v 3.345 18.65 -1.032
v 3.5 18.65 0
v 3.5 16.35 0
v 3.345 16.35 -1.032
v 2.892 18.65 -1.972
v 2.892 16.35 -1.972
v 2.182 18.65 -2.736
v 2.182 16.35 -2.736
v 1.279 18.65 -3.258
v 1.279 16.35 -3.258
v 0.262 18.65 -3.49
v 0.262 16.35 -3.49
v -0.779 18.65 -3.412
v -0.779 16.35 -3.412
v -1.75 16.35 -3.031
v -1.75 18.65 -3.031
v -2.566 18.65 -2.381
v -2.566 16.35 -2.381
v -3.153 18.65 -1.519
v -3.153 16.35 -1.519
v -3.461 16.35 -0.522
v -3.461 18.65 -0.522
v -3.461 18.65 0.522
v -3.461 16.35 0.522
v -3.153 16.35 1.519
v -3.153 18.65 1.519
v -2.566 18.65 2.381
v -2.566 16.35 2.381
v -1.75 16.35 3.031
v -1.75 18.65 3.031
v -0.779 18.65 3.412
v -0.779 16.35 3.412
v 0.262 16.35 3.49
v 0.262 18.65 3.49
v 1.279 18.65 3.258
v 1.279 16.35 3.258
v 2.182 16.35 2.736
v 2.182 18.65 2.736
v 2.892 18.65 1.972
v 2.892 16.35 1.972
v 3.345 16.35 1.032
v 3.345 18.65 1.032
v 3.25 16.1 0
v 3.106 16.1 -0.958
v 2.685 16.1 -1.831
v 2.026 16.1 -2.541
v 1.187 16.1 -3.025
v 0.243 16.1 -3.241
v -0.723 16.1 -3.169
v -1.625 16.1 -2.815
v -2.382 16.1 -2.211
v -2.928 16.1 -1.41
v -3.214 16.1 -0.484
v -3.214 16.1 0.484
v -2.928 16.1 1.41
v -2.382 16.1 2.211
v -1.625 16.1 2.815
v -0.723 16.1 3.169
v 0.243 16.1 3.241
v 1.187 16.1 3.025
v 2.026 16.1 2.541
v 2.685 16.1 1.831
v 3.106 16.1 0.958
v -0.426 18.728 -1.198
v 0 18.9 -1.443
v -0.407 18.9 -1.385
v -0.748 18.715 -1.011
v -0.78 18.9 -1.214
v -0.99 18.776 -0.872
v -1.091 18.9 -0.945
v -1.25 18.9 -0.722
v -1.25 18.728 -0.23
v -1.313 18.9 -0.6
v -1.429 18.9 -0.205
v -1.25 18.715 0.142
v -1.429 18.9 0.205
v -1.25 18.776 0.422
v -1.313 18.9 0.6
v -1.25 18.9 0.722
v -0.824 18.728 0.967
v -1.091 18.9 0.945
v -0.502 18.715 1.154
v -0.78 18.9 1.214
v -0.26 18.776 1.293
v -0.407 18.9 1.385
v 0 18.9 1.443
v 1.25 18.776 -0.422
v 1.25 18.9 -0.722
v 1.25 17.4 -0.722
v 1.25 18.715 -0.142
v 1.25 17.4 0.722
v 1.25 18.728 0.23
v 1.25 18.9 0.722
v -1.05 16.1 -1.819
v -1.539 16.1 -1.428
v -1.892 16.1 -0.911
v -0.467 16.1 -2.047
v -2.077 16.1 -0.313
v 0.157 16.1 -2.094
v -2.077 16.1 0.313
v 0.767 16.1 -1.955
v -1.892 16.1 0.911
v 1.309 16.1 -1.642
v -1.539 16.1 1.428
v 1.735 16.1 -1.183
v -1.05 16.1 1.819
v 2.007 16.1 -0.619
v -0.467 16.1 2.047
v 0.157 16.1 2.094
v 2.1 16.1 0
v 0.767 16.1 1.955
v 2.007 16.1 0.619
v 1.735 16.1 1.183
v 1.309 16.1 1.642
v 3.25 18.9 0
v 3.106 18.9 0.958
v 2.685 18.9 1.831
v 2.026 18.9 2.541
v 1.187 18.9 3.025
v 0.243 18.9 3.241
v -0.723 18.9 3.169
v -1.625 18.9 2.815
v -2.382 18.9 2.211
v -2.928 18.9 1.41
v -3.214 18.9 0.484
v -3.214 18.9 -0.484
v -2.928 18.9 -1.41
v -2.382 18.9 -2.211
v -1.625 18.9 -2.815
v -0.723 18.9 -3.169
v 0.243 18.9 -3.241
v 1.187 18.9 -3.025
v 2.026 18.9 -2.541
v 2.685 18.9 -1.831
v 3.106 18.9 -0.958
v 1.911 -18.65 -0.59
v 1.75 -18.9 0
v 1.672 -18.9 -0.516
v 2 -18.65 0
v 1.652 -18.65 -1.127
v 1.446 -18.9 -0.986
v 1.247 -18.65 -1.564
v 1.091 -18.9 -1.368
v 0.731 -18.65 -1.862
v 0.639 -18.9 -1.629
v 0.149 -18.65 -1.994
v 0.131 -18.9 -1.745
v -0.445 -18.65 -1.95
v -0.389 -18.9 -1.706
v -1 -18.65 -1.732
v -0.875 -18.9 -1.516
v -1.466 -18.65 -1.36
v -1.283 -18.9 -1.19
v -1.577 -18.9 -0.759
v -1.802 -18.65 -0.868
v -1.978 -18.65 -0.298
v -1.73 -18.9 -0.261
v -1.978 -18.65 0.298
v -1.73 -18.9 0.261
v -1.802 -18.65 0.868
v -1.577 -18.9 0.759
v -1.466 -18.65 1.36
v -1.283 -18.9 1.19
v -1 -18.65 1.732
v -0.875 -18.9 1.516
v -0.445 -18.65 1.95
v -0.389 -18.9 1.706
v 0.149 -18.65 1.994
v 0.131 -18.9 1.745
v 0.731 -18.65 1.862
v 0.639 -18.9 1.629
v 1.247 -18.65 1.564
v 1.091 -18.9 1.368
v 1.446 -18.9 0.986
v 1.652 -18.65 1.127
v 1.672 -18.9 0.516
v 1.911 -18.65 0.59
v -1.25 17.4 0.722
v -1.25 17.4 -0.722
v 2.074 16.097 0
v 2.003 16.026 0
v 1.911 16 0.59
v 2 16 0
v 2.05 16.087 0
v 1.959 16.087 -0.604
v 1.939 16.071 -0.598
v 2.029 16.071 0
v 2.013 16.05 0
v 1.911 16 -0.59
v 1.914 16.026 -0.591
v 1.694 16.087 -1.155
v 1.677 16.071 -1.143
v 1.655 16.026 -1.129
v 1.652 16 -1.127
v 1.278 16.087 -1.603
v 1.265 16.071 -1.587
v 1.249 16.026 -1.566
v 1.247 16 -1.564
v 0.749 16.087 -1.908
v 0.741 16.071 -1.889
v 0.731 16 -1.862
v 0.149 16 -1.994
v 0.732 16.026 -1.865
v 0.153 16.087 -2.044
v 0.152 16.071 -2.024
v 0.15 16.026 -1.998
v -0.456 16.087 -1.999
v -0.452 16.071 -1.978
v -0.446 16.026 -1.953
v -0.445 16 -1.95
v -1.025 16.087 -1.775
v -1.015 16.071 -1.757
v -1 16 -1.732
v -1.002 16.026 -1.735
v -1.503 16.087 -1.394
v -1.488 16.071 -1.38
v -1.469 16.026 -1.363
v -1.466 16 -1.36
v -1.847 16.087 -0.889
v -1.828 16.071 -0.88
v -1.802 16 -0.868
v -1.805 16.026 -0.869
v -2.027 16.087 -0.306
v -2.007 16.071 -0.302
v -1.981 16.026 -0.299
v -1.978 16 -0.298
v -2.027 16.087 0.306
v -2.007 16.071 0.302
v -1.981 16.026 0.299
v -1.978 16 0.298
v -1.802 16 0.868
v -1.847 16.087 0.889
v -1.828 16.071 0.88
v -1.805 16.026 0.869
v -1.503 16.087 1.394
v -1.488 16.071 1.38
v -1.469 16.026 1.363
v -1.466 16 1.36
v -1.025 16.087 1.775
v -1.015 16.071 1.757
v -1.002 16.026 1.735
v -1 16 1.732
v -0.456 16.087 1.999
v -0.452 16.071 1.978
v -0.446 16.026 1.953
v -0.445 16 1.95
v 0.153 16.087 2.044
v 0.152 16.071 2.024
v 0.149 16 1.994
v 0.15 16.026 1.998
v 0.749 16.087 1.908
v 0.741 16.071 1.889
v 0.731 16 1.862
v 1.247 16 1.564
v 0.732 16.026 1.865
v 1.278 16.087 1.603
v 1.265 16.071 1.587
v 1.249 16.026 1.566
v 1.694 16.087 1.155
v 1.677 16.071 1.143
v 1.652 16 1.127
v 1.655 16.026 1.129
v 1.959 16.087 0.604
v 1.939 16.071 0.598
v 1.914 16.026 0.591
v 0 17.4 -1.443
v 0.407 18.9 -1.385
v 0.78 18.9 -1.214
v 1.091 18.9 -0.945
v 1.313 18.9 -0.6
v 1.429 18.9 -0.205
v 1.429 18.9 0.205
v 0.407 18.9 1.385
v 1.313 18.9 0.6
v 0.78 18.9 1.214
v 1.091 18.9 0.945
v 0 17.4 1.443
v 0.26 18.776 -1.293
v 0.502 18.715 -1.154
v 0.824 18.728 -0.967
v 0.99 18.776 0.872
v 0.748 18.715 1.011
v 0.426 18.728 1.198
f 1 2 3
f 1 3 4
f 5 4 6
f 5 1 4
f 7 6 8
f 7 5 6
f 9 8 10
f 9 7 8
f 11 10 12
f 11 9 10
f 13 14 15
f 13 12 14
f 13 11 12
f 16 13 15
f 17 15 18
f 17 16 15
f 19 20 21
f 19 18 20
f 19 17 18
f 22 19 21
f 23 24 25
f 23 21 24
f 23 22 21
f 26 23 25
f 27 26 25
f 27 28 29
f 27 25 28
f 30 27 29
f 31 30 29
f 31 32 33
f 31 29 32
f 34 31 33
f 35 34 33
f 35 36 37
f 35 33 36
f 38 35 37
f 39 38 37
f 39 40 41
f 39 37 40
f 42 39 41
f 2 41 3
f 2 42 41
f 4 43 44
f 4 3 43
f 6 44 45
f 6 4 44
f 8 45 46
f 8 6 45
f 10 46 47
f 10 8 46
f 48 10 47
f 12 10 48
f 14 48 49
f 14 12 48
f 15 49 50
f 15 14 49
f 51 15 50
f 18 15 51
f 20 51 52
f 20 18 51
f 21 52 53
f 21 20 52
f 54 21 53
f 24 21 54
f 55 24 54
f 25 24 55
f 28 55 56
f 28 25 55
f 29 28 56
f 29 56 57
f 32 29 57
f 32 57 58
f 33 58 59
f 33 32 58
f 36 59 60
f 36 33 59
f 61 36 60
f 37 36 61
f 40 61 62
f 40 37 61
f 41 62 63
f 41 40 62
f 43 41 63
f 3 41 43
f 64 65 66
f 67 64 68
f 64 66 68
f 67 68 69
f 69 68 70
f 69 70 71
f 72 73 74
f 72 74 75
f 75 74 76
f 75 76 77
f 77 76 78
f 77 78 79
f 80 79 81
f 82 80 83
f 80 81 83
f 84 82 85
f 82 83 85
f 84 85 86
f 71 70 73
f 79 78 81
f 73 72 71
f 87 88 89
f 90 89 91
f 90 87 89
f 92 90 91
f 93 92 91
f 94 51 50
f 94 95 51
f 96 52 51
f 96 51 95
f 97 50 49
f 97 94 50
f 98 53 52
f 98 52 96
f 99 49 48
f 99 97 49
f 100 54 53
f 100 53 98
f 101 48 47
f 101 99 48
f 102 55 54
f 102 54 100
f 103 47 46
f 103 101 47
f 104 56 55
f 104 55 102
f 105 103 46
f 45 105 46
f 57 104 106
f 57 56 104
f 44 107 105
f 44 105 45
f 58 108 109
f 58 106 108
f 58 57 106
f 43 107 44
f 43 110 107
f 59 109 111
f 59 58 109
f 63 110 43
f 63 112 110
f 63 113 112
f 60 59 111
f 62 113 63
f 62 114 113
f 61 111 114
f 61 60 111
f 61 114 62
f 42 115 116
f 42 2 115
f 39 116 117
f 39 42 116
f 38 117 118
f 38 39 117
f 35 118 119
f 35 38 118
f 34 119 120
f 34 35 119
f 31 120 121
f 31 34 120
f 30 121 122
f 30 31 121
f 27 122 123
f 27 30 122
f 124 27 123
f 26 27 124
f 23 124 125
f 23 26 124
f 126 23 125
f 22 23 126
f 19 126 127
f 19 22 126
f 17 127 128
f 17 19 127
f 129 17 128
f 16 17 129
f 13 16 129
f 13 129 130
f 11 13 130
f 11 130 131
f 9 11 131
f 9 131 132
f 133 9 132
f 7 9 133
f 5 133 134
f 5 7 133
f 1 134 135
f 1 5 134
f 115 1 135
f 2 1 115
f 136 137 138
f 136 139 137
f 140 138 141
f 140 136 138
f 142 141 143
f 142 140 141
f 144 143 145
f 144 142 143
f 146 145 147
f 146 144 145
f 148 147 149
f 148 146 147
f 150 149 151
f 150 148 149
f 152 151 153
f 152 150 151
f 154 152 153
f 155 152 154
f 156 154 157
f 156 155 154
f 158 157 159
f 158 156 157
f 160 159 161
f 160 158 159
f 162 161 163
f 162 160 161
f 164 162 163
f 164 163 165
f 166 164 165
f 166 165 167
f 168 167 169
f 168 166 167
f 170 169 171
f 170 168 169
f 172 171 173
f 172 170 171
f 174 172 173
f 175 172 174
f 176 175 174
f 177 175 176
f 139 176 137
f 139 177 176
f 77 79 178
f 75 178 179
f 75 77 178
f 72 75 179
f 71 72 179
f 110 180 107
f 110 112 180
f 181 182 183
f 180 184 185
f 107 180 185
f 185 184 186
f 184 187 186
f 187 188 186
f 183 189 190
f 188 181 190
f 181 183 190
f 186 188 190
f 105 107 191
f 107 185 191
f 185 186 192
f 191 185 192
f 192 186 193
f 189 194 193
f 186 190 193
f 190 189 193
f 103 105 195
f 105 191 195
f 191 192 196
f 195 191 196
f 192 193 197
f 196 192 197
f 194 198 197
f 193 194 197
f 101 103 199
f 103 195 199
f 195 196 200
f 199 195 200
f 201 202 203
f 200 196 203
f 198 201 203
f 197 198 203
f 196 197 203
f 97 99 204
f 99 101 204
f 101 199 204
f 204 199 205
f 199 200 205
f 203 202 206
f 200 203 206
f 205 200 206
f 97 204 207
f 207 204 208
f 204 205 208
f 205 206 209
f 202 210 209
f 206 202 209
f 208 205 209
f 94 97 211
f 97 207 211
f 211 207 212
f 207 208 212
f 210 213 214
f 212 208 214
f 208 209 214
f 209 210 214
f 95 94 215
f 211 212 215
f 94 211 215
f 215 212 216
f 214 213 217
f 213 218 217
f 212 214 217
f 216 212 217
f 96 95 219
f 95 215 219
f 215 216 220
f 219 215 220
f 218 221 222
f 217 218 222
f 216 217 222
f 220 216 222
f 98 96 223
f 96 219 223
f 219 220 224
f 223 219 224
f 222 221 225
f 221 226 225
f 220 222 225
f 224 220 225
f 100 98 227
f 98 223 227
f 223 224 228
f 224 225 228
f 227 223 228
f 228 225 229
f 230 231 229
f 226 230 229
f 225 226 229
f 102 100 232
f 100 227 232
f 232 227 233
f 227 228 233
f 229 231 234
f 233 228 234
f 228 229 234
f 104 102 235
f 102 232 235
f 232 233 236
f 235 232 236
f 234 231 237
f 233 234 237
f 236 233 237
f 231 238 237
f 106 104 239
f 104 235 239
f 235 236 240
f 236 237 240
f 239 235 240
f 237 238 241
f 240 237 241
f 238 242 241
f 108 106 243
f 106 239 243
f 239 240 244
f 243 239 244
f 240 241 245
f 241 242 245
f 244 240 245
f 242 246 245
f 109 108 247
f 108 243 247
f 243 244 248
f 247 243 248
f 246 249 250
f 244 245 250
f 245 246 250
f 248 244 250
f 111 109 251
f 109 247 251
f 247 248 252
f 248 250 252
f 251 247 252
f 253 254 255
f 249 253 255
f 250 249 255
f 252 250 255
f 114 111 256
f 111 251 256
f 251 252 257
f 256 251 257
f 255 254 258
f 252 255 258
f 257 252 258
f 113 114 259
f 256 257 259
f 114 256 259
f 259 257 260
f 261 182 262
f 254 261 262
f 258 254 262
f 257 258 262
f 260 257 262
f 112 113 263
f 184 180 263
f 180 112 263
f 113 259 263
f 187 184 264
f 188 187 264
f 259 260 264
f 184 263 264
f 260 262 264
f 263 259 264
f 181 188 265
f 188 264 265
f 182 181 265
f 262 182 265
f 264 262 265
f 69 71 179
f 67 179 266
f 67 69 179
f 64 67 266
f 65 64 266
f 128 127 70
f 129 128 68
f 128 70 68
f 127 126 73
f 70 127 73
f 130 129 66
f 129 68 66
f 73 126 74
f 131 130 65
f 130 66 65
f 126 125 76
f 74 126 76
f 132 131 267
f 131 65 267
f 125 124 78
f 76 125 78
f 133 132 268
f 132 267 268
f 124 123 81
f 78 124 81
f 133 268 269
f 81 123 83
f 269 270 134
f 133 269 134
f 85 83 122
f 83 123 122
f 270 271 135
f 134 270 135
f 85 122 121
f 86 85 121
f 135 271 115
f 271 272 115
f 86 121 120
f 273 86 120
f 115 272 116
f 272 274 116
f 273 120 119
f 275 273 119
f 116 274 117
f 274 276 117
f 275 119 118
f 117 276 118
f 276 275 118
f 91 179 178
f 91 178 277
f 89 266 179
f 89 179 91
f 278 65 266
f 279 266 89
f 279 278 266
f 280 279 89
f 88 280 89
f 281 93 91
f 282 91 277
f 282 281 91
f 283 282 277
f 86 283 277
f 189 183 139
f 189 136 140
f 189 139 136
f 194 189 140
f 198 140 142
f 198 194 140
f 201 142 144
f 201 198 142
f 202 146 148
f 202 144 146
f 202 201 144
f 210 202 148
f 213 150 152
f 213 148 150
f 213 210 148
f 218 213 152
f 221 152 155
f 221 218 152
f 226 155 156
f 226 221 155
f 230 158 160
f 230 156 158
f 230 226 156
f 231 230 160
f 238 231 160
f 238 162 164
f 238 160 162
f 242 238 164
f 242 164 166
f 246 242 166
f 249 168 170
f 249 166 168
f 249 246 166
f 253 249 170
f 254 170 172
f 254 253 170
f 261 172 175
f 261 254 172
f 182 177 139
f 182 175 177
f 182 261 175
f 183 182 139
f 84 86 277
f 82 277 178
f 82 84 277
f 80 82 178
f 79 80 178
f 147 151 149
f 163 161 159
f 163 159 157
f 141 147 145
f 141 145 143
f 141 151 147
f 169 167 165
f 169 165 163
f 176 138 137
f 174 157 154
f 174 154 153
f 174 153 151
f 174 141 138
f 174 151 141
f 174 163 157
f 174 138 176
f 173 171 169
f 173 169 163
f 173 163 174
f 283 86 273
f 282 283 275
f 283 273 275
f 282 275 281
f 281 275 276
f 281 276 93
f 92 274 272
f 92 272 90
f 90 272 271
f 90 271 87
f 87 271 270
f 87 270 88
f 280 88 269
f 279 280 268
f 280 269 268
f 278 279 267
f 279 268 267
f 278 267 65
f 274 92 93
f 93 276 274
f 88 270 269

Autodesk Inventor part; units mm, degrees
ref_plane "YZ Plane" through (0, 0, 0) normal (1, 0, 0) x (0, 1, 0)
ref_plane "XZ Plane" through (0, 0, 0) normal (0, 1, 0) x (-1, 0, 0)
ref_plane "XY Plane" through (0, 0, 0) normal (0, 0, 1) x (1, 0, 0)
sketch "Sketch1" plane through (0, 0, 0) normal (0, 0, 1) x (1, 0, 0)
  line L0 (0, 18.9) -> (0, -18.9)
  line L1 (0, -18.9) -> (1.75, -18.9)
  line L2 (1.75, -18.9) -> (2, -18.65)
  line L3 (2, -18.65) -> (2, 16)
  line L4 (2.1, 16.1) -> (3.25, 16.1)
  line L5 (3.5, 16.35) -> (3.5, 18.65)
  line L6 (3.25, 18.9) -> (0, 18.9)
  arc A0 (2.1, 16.1) -> (2, 16) centre (2.1, 16) ccw
  line L7 (3.25, 18.9) -> (3.5, 18.65)
  line L8 (3.25, 16.1) -> (3.5, 16.35)
  point P0 (0, 0)
  point P1 (3.5, 16.1)
  point P2 (3.5, 18.9)
  point P3 (0, 0)
  dimension "d0" = 7
  dimension "d1" = 2.8
  dimension "d3" = 4
  dimension "d4" = 4.2
  dimension "d5" = 135
  dimension "d6" = 0.25
  dimension "d7" = 35
  dimension "d9" = 0.25
revolve "Revolution1" add sketch "Sketch1" angle 360 about axis through (0, 18.9, 0) along (0, -1, 0)
sketch "Sketch2" plane through (0, 18.9, 0) normal (0, 1, 0) x (1, 0, 0)
  line L0 (0, -1.4434) -> (-1.25, -0.7217)
  line L1 (-1.25, -0.7217) -> (-1.25, 0.7217)
  line L2 (-1.25, 0.7217) -> (0, 1.4434)
  line L3 (0, 1.4434) -> (1.25, 0.7217)
  line L4 (1.25, 0.7217) -> (1.25, -0.7217)
  line L5 (1.25, -0.7217) -> (0, -1.4434)
  point P0 (0, 0)
  point P1 (0, 0)
  dimension "d11" = 2.5
extrude "Extrusion1" cut sketch "Sketch2" against normal blind 1.5
thread "Thread1" size "M4x0.7" class "6g" standard "ANSI Metric M Profile" length 14
sketch "Sketch3" plane through (0, 0, 0) normal (1, 0, 0) x (0, 1, 0)
  line L0 (18.9, 1.4434) -> (17.9, 0.4434)
  line L1 (17.9, 0.4434) -> (18.9, 0.4434)
  line L2 (18.9, 0.4434) -> (18.9, 1.4434)
  line L3 (-1.4, 0) -> (8.4, 0) projected
  point P0 (0, 0)
  dimension "d18" = 1
revolve "Revolution2" cut sketch "Sketch3" angle 360 about axis through (0, -10, 0) along (0, 1, 0)
properties part number "Bolt_M4x0.7_35mm_LSH" material "Stainless Steel"
